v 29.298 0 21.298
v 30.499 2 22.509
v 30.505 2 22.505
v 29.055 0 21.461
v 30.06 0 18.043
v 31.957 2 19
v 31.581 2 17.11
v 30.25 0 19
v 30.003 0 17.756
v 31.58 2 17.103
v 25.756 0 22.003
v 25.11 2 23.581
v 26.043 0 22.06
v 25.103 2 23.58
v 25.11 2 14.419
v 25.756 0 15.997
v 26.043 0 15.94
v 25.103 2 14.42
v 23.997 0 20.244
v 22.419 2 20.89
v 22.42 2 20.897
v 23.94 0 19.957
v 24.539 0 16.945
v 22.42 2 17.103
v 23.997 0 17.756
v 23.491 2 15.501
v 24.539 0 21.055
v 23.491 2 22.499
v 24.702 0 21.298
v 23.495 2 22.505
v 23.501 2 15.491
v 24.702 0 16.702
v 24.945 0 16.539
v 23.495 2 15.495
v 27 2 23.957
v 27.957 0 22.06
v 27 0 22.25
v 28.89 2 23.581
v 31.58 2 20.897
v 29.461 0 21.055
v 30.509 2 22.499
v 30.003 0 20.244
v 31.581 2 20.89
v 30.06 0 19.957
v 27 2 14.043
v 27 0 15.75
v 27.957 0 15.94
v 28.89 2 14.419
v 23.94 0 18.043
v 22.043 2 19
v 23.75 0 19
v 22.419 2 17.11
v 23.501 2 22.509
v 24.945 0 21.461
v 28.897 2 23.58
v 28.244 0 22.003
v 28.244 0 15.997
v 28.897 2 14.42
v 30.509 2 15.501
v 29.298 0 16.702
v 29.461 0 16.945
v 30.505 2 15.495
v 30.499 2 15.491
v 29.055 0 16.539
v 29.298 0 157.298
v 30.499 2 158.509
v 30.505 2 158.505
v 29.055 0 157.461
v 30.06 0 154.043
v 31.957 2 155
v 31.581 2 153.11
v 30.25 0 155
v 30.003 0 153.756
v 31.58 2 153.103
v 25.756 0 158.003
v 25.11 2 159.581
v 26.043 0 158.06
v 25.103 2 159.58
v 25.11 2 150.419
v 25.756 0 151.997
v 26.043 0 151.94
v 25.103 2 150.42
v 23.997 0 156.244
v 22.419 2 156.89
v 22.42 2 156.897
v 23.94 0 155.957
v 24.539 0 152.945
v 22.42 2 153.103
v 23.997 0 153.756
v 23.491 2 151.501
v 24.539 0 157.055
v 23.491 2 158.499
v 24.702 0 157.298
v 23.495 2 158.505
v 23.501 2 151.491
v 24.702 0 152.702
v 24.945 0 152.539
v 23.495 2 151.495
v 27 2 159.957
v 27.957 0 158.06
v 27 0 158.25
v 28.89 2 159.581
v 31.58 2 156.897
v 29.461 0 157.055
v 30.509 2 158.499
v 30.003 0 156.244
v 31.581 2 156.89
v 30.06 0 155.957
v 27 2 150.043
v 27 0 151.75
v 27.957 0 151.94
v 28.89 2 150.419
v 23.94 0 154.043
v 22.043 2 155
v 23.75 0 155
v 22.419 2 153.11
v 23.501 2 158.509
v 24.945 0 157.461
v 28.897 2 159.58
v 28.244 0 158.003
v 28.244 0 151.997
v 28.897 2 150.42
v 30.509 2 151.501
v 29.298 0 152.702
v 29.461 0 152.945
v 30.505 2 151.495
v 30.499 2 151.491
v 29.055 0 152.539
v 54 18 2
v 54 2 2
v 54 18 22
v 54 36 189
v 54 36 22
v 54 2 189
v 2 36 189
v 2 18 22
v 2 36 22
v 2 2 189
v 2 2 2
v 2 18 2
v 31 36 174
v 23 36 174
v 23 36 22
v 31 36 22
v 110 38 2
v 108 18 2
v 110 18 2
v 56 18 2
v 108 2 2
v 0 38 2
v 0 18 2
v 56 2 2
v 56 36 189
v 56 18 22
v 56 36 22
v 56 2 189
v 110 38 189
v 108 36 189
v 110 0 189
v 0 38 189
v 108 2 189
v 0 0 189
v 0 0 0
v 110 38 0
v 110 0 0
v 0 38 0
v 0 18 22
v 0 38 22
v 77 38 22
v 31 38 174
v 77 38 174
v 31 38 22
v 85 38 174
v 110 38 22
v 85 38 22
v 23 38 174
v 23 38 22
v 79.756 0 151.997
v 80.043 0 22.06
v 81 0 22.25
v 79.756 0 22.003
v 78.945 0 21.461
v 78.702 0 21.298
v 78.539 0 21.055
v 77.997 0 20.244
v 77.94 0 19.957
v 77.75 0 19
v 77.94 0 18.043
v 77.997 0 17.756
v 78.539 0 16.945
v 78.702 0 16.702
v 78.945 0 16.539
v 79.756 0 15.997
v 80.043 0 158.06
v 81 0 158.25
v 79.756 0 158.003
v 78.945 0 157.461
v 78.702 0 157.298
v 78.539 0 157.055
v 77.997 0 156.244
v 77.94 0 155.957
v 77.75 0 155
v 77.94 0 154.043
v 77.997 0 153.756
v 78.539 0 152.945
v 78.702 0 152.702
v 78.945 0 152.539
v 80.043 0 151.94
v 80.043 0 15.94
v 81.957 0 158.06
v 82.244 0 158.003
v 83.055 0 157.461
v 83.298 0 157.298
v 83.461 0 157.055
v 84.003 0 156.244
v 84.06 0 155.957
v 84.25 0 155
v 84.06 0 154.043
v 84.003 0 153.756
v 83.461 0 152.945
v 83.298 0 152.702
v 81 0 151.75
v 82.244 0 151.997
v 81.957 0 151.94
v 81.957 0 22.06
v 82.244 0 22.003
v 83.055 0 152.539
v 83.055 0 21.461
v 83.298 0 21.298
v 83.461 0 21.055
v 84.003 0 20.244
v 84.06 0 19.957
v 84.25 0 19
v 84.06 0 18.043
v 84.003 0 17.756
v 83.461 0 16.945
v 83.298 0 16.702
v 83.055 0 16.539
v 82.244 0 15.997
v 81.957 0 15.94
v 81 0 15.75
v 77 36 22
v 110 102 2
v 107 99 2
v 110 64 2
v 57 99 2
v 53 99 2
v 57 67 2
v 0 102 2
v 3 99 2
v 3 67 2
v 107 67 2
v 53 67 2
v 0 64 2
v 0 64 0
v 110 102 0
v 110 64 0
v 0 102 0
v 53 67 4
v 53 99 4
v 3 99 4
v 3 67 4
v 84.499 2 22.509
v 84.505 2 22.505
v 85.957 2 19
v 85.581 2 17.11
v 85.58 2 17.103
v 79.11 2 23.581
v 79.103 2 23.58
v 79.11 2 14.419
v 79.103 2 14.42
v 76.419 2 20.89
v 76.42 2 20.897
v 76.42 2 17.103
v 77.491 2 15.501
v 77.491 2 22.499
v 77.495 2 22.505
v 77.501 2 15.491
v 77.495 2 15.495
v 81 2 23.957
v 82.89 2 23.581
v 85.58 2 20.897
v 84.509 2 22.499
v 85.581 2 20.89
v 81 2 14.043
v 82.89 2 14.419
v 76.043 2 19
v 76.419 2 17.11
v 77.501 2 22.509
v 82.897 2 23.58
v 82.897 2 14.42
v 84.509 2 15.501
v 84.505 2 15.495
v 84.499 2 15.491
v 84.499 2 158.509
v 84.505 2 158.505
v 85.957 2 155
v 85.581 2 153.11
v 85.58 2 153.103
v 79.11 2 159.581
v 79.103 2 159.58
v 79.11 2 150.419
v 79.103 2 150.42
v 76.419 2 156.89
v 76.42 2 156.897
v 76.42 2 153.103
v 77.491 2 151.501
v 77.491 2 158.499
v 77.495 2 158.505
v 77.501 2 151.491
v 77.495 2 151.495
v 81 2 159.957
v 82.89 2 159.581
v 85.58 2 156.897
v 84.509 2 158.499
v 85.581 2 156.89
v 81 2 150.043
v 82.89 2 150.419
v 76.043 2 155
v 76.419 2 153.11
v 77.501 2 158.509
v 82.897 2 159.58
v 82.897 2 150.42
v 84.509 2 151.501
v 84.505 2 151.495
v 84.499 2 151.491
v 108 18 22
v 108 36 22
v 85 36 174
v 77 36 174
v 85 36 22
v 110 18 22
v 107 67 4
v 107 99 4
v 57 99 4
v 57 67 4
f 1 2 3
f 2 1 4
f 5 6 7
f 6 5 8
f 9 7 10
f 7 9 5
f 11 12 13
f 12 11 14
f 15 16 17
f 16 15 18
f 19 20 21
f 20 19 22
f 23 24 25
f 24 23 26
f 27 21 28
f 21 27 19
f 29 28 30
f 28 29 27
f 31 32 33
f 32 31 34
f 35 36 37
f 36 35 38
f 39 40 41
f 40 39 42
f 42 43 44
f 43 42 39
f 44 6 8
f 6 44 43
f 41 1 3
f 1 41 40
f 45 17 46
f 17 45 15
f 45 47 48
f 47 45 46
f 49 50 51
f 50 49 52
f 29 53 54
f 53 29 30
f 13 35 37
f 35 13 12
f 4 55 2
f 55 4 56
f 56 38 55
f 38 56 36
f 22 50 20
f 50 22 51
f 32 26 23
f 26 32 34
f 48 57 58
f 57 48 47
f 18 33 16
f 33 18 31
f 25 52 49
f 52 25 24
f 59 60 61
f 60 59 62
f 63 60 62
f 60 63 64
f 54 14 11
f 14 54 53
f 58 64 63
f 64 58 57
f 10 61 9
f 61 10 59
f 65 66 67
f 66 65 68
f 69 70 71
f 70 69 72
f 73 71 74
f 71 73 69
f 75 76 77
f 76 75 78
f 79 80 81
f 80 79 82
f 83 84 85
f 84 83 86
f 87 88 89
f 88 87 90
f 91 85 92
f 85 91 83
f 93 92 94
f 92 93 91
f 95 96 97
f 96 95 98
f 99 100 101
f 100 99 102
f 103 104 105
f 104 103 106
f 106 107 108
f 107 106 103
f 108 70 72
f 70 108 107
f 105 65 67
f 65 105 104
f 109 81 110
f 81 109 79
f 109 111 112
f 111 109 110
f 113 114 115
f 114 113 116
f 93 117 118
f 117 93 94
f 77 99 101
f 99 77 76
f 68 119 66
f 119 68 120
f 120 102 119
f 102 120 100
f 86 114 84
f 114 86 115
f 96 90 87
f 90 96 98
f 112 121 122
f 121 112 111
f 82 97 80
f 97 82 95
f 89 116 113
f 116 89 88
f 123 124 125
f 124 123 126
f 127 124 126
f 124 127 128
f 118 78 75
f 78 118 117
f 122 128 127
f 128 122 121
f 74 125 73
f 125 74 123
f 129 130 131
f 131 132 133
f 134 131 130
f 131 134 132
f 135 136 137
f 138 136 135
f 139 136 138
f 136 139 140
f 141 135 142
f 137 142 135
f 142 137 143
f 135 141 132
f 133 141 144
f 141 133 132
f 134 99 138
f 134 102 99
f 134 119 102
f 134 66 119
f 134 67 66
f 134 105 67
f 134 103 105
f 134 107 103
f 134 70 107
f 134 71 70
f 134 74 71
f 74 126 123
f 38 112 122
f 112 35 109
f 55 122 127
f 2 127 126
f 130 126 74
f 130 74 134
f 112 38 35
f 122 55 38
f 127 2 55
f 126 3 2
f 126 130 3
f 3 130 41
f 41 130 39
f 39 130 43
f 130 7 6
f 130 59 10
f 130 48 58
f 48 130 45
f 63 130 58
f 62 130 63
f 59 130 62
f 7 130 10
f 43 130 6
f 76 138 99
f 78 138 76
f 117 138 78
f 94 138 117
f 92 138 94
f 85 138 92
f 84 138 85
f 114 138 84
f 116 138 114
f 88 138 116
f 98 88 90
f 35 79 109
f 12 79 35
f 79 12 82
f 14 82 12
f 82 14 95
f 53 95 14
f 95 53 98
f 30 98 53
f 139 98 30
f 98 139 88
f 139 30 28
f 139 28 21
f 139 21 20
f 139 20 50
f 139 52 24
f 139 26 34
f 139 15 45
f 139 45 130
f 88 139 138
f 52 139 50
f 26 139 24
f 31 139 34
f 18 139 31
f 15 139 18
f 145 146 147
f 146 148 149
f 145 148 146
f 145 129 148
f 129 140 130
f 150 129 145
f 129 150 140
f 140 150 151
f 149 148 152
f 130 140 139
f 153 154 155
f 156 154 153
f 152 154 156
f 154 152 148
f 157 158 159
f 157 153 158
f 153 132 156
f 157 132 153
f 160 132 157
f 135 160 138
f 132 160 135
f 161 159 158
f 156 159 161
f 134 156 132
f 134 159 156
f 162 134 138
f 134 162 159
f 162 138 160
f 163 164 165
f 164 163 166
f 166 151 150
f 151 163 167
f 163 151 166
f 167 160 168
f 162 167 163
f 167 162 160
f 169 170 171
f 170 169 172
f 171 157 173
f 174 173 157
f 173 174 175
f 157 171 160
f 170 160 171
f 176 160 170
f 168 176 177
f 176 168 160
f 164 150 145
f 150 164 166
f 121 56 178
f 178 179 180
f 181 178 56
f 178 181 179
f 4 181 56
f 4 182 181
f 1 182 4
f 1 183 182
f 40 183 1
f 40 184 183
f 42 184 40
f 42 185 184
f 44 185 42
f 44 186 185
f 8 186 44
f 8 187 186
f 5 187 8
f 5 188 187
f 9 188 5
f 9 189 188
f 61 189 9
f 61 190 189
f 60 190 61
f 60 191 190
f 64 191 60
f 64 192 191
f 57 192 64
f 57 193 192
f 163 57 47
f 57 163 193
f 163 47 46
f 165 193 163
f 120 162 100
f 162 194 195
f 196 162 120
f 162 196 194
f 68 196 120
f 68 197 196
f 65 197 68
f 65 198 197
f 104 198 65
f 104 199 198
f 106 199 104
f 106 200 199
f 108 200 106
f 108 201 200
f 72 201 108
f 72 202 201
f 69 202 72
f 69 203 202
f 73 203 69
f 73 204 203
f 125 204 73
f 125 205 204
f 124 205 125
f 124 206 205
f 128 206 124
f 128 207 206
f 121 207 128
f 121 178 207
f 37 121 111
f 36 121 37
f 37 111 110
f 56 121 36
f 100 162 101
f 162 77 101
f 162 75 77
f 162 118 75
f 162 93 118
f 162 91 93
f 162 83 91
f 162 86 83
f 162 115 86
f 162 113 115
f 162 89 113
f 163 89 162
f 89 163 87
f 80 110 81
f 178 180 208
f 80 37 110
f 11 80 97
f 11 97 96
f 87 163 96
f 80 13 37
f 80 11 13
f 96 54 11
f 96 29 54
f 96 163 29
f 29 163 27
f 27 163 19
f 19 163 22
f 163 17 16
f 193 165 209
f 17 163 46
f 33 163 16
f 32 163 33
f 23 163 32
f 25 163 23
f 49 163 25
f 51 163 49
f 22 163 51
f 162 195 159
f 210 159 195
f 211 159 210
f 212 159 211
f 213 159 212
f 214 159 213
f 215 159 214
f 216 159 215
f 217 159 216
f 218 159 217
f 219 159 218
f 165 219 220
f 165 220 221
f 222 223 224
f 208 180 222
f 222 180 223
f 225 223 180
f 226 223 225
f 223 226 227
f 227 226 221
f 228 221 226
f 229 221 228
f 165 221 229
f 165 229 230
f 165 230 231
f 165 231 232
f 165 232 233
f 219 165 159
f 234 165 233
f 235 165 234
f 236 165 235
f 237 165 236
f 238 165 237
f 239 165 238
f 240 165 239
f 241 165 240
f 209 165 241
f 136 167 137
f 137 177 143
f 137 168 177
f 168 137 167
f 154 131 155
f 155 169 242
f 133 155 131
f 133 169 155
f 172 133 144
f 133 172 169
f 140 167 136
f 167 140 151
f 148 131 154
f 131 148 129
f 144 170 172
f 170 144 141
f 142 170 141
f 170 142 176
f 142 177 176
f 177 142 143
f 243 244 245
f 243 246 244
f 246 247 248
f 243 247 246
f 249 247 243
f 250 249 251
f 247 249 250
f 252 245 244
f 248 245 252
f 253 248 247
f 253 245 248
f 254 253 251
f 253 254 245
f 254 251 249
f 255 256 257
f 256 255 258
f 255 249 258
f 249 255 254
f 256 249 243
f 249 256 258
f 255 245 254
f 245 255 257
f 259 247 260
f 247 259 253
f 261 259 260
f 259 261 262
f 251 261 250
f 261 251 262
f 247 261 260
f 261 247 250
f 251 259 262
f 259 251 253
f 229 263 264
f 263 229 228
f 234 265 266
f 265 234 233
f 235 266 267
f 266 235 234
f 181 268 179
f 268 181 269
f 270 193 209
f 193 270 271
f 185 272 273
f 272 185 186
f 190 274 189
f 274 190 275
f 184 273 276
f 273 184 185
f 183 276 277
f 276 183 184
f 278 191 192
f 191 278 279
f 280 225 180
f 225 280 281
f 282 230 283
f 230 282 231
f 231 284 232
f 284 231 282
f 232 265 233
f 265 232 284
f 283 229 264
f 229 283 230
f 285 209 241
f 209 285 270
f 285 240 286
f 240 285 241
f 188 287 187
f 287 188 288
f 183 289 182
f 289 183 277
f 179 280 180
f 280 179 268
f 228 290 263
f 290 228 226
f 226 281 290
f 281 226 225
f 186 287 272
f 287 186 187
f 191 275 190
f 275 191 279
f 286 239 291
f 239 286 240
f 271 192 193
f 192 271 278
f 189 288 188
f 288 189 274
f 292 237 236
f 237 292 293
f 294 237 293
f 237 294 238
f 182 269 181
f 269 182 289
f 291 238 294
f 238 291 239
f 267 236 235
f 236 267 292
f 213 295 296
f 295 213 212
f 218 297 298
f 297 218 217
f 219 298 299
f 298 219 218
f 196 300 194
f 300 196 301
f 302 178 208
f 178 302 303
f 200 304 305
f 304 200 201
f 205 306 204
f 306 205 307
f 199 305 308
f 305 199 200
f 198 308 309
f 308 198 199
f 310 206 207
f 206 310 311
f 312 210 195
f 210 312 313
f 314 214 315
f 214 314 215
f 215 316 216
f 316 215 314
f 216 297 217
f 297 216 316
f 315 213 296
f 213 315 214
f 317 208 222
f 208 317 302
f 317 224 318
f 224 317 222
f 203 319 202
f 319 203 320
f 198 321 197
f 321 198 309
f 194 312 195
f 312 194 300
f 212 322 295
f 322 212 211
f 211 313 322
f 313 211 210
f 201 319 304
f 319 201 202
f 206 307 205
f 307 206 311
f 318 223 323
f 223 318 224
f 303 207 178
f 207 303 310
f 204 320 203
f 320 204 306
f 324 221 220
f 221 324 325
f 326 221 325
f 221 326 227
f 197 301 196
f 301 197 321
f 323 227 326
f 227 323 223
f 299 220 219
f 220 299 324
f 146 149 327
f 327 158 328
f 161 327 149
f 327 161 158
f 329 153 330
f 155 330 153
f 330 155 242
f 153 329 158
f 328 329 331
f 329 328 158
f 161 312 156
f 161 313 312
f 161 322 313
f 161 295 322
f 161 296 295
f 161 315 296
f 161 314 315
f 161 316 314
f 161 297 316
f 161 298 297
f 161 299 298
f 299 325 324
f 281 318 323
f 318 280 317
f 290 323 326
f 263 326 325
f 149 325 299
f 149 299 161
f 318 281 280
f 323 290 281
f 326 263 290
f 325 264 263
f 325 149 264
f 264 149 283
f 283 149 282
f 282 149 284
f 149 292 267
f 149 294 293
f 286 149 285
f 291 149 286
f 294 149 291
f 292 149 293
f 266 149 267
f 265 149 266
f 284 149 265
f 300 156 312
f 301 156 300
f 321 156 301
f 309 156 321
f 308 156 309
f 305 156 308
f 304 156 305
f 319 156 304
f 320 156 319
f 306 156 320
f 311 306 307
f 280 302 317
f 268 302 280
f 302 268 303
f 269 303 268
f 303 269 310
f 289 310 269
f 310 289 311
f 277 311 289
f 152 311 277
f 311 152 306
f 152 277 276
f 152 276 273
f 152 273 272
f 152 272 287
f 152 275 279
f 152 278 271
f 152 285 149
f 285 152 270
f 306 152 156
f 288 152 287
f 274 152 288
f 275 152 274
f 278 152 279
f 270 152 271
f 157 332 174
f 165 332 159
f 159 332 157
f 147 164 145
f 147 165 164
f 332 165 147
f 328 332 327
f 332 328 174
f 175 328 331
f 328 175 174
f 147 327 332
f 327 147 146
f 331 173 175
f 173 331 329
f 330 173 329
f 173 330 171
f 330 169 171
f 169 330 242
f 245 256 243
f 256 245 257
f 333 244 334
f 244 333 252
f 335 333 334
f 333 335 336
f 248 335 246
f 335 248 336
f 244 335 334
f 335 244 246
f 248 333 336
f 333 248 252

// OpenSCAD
cube_width=50;
cube_depth=32;
cube_height=17;
cube_padding=1;
walls=2;
nbr_of_cubes_per_bloc=10;
nbr_blocks=2;
unloading_height=20;
front_opening_width=8;

top_free=1*cube_height;
// modules
module make_cubes(width,depth,height,padding,nbr_of_cubes_per_bloc,top_free){
    cube([width+(2*padding),depth+(2*padding),height]);
    for(i = [1 : 1 : nbr_of_cubes_per_bloc-1]){
        translate([0,0,i*height-1]){
            cube([width+(2*padding),depth+(2*padding),height+1]);
            }
        }
    translate([0,0,nbr_of_cubes_per_bloc*+height]){
        cube([width+(2*padding),depth+(2*padding),height*nbr_of_cubes_per_bloc+top_free*2]);
        }       
    }


// building  
         
//cube([cube_width,cube_depth,cube_height]);  



for(bloc = [1 : 1 : nbr_blocks]){
	translate([((walls+cube_width+cube_padding*2)*(bloc-1)),0,0]){

//------------------------------  
   difference(){
       //container
       cube([cube_width+2*(walls+cube_padding),cube_depth+2*(walls+cube_padding),cube_height*nbr_of_cubes_per_bloc+walls+top_free]);
       //---------------------------------------------------------------
       // holes for screws
       translate([walls+cube_width/2,-1+walls/2,walls]){
           translate([0,0,cube_height]){
               rotate ([-90,0,0]) cylinder(h = walls+2.1, r1 = 1.5, r2 = 5, center = true);
               }
            translate([0,0,cube_height*(nbr_of_cubes_per_bloc-1)]){
               rotate ([-90,0,0]) cylinder(h = walls+2.1, r1 = 1.5, r2 = 5, center = true);
               }
           }
       // unloading opening      
       translate([-walls,walls+cube_depth/2,walls]){
            cube([cube_width+3*(walls+cube_padding),cube_depth+2*(walls+cube_padding),unloading_height]);
            }
       //front view
       translate([walls+cube_width/2-(front_opening_width/2),walls+cube_depth,walls]){
            cube([front_opening_width,+cube_depth*2,cube_height*nbr_of_cubes_per_bloc+walls]);
            }
        //cubes space
        translate([walls,walls,walls]){    
            make_cubes(cube_width,cube_depth,cube_height,cube_padding,nbr_of_cubes_per_bloc,top_free);
                }
       
       }
//------------------------------ 
// cover
	translate([0,cube_depth*2,0]){		
		cube([cube_width+2*(walls+cube_padding),cube_depth+2*(walls+cube_padding),walls]);
		translate([walls+cube_padding,walls+cube_padding,walls]){
			cube([cube_width,cube_depth,walls]);
			}
		}
	}
}   
    
    
